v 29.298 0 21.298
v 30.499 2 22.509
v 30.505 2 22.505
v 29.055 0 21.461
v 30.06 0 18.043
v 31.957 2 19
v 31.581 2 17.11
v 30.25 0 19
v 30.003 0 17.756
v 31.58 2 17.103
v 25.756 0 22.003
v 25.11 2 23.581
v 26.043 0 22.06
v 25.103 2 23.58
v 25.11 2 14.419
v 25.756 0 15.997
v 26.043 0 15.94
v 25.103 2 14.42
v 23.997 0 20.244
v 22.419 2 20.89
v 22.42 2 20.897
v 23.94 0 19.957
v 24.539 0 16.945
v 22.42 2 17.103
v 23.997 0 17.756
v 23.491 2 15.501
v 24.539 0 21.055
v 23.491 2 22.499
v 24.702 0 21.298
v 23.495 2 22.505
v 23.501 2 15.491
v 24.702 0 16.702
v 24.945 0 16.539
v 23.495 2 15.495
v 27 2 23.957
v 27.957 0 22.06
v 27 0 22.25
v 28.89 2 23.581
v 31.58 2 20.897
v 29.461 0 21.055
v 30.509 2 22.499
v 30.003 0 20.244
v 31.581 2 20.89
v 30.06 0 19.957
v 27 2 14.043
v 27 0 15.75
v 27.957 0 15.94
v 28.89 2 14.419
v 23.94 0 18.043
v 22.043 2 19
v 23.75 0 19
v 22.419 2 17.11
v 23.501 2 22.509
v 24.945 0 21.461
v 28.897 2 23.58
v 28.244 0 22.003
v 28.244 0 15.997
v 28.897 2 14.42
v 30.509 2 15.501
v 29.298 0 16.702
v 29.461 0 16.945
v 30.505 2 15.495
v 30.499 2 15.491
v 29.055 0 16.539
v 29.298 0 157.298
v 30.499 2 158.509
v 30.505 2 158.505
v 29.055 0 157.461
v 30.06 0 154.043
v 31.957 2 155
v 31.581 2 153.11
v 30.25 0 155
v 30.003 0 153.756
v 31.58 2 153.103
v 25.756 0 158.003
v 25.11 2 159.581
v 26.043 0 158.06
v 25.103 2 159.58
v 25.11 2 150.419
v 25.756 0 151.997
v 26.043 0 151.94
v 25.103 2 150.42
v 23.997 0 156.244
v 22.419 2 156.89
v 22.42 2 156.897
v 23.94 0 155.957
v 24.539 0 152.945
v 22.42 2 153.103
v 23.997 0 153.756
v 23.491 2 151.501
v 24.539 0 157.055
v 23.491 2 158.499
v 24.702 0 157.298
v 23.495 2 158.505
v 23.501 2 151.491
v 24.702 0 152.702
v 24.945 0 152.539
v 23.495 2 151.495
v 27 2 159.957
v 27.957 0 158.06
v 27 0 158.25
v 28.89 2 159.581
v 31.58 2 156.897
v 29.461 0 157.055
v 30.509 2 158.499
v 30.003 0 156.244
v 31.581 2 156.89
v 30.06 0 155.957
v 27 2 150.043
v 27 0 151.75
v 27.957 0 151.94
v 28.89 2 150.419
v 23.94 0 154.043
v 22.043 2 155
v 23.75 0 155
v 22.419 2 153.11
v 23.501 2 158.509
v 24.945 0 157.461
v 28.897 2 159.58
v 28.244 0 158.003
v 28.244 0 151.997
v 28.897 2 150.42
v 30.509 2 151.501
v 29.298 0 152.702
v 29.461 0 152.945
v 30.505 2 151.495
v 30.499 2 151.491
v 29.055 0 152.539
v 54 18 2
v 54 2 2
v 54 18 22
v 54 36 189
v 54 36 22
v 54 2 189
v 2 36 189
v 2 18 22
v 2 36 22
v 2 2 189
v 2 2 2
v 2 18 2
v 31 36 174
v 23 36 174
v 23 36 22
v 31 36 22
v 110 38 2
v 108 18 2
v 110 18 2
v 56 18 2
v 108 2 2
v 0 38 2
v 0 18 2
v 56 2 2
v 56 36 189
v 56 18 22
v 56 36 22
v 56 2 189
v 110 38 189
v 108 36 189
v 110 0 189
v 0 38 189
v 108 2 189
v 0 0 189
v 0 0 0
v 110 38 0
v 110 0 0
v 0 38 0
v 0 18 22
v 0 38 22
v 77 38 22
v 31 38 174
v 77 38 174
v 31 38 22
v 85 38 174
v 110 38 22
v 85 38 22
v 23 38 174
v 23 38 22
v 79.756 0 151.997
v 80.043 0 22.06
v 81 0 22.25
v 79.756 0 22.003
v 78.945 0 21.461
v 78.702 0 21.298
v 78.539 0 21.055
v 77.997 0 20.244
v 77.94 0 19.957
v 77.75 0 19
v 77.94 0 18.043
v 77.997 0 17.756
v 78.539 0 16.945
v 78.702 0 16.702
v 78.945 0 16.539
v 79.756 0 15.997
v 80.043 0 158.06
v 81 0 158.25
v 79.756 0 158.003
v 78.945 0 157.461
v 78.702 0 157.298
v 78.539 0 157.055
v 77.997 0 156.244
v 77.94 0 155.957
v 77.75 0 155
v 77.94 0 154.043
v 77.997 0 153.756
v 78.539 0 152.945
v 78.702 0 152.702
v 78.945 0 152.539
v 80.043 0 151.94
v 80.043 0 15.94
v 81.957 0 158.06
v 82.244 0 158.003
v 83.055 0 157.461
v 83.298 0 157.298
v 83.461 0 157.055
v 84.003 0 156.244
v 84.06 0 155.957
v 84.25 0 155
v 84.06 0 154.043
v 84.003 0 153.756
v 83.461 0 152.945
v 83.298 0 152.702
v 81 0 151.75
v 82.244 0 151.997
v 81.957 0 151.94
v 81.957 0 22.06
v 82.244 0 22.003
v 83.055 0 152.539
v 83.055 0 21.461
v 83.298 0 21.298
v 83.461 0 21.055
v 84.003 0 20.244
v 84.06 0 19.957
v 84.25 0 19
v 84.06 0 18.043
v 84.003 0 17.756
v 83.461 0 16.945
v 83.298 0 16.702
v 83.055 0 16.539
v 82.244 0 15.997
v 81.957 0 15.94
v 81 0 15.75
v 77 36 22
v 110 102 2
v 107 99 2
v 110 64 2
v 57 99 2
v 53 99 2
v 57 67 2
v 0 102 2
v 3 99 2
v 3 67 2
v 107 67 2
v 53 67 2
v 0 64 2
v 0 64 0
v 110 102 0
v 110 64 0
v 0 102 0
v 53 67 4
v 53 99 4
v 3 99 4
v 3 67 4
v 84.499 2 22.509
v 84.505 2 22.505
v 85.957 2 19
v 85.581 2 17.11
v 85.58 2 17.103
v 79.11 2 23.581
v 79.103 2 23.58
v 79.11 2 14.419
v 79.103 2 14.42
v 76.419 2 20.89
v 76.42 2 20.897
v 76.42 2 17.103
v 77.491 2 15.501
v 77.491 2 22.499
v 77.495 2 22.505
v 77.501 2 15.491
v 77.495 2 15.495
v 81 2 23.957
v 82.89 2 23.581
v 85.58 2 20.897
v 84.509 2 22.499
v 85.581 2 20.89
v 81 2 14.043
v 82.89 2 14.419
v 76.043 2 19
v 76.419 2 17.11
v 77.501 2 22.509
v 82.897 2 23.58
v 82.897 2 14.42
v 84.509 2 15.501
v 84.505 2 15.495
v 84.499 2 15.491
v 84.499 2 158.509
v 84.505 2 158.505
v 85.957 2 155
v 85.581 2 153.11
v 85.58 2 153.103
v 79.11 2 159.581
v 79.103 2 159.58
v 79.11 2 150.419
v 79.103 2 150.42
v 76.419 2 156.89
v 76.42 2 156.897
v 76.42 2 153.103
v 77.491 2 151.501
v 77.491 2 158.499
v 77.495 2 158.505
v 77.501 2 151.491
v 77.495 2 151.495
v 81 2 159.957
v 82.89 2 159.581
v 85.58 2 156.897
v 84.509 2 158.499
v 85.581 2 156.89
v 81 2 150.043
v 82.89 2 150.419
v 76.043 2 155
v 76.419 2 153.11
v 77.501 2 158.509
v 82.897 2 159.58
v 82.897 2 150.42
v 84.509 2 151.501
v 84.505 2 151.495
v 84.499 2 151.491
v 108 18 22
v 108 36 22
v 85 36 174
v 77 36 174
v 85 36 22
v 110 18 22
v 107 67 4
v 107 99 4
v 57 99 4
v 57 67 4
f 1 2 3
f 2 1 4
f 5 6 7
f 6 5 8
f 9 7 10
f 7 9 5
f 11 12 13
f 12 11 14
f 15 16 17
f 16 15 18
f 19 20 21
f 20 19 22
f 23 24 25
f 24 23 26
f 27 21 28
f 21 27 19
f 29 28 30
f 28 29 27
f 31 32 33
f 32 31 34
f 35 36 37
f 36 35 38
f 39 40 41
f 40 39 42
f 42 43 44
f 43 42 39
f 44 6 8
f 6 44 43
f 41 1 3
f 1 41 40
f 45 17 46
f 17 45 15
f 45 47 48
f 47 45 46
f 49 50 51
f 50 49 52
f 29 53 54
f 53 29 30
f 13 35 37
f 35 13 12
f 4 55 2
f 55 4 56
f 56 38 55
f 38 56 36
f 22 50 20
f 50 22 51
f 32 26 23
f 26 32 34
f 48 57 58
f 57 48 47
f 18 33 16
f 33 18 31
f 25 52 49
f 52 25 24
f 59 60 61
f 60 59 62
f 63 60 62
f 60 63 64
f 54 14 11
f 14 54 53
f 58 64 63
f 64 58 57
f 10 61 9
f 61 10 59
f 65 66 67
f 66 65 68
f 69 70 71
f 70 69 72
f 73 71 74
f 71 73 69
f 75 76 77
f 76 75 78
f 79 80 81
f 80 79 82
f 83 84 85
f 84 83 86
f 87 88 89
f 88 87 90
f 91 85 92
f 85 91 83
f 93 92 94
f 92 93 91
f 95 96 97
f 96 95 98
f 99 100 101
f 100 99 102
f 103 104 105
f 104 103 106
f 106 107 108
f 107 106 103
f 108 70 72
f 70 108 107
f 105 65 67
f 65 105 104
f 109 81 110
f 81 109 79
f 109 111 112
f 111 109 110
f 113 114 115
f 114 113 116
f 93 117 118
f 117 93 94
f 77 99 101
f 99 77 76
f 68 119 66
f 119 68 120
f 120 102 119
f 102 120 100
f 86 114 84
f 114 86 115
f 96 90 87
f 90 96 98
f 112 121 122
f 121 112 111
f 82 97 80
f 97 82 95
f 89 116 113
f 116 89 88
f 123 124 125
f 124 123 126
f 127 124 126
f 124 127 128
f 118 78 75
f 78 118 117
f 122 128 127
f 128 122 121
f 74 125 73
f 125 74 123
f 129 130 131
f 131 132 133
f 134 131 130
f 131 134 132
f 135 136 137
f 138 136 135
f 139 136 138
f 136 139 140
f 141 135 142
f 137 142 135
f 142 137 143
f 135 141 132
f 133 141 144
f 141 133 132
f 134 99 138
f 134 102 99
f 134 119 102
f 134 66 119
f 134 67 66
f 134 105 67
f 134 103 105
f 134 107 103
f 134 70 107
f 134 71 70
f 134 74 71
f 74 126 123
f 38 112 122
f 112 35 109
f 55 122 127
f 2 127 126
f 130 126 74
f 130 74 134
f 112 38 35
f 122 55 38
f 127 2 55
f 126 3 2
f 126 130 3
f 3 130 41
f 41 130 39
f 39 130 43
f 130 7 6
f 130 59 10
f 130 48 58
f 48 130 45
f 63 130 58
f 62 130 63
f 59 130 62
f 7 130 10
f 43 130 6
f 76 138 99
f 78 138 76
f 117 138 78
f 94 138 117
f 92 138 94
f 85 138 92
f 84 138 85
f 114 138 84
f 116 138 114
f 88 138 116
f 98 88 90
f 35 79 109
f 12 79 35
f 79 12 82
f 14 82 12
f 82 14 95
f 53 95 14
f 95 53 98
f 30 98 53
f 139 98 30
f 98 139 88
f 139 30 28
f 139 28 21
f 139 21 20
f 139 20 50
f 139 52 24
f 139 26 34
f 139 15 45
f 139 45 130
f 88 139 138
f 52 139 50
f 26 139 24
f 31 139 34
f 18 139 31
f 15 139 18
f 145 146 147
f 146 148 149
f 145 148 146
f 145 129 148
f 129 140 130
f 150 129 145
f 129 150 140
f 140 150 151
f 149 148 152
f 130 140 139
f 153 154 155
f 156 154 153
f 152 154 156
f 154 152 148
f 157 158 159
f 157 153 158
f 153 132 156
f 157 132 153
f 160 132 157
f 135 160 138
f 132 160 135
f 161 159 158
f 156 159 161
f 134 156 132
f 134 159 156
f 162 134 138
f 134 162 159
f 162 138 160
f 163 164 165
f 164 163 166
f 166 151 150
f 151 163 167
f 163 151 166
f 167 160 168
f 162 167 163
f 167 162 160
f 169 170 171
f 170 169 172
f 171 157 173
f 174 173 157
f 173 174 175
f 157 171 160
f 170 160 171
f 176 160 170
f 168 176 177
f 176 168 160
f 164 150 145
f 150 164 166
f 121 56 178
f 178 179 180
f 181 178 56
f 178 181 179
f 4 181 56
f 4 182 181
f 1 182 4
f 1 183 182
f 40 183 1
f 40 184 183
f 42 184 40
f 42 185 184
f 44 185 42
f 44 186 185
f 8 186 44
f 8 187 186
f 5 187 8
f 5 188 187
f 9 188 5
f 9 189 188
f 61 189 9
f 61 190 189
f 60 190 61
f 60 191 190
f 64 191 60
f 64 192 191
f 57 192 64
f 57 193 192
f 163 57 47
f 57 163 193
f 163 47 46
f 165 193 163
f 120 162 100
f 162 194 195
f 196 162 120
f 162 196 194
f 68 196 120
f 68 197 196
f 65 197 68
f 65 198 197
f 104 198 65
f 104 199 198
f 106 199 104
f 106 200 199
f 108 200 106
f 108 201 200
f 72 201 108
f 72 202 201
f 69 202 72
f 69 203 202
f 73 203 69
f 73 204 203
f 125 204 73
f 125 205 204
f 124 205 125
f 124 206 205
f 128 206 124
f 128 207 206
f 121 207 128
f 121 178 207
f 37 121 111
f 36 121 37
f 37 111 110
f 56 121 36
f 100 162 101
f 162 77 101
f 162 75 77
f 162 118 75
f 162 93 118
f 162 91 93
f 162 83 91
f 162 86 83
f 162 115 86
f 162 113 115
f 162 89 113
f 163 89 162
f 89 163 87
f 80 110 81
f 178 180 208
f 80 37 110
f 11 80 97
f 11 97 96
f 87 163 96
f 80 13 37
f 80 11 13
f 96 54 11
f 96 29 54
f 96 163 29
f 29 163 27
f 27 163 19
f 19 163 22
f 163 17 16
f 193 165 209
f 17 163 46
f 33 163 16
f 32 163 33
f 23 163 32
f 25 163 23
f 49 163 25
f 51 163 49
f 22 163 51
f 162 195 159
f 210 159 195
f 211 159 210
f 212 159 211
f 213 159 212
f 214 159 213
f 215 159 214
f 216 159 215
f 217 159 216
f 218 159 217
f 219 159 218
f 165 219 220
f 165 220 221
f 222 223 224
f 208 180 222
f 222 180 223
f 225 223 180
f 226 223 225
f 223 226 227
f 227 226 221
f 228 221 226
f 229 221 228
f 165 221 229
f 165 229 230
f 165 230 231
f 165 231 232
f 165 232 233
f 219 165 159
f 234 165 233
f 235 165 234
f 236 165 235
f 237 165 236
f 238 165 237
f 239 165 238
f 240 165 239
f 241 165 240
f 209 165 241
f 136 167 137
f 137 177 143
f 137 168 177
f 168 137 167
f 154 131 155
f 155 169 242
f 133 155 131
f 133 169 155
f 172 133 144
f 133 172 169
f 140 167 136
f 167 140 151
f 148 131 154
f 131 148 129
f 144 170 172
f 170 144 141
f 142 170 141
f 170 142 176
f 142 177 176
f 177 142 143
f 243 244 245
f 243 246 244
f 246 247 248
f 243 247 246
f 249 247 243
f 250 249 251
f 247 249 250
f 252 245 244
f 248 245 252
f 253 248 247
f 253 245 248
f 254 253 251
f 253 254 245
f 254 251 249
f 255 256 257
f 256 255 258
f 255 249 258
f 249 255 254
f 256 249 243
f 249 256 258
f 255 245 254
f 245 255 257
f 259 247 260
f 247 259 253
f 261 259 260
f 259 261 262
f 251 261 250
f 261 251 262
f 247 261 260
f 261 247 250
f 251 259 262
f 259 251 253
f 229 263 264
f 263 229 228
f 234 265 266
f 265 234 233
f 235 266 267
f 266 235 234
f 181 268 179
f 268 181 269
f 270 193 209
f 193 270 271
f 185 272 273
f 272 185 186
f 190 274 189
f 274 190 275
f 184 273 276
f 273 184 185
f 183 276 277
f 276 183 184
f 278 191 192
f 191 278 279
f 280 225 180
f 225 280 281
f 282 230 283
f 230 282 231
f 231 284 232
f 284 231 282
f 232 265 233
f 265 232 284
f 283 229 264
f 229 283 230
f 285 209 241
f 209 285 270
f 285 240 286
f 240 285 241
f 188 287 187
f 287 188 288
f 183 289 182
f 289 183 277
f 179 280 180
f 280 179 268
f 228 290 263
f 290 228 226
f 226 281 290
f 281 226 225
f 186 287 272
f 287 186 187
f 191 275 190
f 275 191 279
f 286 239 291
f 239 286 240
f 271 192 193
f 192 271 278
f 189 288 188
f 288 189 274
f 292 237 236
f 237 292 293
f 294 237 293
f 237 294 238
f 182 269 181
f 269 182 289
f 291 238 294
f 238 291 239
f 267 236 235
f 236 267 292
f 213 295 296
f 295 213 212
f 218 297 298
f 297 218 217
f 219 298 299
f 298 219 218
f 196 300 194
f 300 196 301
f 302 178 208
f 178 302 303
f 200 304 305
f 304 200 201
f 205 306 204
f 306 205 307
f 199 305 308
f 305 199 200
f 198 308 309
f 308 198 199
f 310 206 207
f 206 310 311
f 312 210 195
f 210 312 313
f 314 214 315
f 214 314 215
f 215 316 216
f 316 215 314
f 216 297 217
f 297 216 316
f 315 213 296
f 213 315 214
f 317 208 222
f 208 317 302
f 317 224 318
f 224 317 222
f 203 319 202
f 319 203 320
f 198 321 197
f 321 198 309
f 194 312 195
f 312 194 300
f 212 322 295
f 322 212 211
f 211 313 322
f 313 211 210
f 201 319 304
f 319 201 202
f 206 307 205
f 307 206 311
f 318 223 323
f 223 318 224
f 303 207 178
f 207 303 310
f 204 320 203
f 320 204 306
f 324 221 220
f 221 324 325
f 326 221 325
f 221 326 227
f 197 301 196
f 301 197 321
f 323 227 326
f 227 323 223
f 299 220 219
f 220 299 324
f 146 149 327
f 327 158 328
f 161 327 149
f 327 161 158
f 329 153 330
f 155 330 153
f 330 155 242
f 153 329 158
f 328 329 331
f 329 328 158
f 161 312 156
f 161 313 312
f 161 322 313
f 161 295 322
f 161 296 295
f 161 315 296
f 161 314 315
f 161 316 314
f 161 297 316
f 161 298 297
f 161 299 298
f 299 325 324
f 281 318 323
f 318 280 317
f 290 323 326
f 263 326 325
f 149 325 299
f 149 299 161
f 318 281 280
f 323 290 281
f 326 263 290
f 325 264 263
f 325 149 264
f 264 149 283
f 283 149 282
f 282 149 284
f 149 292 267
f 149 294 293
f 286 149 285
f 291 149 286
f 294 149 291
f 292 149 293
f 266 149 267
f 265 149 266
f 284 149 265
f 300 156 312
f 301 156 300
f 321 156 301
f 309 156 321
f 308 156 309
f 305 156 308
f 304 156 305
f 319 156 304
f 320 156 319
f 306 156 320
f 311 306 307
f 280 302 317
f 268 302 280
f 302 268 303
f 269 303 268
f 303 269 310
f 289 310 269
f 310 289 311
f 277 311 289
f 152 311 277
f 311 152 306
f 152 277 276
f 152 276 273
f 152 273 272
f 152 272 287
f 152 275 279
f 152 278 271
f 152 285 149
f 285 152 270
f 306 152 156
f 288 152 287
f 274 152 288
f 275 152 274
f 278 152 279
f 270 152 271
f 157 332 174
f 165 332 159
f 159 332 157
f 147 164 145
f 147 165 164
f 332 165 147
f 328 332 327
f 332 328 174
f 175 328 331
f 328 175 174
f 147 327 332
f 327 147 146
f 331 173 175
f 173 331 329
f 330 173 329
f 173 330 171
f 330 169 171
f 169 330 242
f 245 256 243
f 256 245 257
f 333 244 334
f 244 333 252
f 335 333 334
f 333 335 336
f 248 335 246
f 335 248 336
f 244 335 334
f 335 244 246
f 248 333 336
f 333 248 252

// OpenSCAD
cube_width=50;
cube_depth=32;
cube_height=17;
cube_padding=1;
walls=2;
nbr_of_cubes_per_bloc=10;
nbr_blocks=2;
unloading_height=20;
front_opening_width=8;

top_free=1*cube_height;
// modules
module make_cubes(width,depth,height,padding,nbr_of_cubes_per_bloc,top_free){
    cube([width+(2*padding),depth+(2*padding),height]);
    for(i = [1 : 1 : nbr_of_cubes_per_bloc-1]){
        translate([0,0,i*height-1]){
            cube([width+(2*padding),depth+(2*padding),height+1]);
            }
        }
    translate([0,0,nbr_of_cubes_per_bloc*+height]){
        cube([width+(2*padding),depth+(2*padding),height*nbr_of_cubes_per_bloc+top_free*2]);
        }       
    }


// building  
         
//cube([cube_width,cube_depth,cube_height]);  



for(bloc = [1 : 1 : nbr_blocks]){
	translate([((walls+cube_width+cube_padding*2)*(bloc-1)),0,0]){

//------------------------------  
   difference(){
       //container
       cube([cube_width+2*(walls+cube_padding),cube_depth+2*(walls+cube_padding),cube_height*nbr_of_cubes_per_bloc+walls+top_free]);
       //---------------------------------------------------------------
       // holes for screws
       translate([walls+cube_width/2,-1+walls/2,walls]){
           translate([0,0,cube_height]){
               rotate ([-90,0,0]) cylinder(h = walls+2.1, r1 = 1.5, r2 = 5, center = true);
               }
            translate([0,0,cube_height*(nbr_of_cubes_per_bloc-1)]){
               rotate ([-90,0,0]) cylinder(h = walls+2.1, r1 = 1.5, r2 = 5, center = true);
               }
           }
       // unloading opening      
       translate([-walls,walls+cube_depth/2,walls]){
            cube([cube_width+3*(walls+cube_padding),cube_depth+2*(walls+cube_padding),unloading_height]);
            }
       //front view
       translate([walls+cube_width/2-(front_opening_width/2),walls+cube_depth,walls]){
            cube([front_opening_width,+cube_depth*2,cube_height*nbr_of_cubes_per_bloc+walls]);
            }
        //cubes space
        translate([walls,walls,walls]){    
            make_cubes(cube_width,cube_depth,cube_height,cube_padding,nbr_of_cubes_per_bloc,top_free);
                }
       
       }
//------------------------------ 
// cover
	translate([0,cube_depth*2,0]){		
		cube([cube_width+2*(walls+cube_padding),cube_depth+2*(walls+cube_padding),walls]);
		translate([walls+cube_padding,walls+cube_padding,walls]){
			cube([cube_width,cube_depth,walls]);
			}
		}
	}
}   
    
    
